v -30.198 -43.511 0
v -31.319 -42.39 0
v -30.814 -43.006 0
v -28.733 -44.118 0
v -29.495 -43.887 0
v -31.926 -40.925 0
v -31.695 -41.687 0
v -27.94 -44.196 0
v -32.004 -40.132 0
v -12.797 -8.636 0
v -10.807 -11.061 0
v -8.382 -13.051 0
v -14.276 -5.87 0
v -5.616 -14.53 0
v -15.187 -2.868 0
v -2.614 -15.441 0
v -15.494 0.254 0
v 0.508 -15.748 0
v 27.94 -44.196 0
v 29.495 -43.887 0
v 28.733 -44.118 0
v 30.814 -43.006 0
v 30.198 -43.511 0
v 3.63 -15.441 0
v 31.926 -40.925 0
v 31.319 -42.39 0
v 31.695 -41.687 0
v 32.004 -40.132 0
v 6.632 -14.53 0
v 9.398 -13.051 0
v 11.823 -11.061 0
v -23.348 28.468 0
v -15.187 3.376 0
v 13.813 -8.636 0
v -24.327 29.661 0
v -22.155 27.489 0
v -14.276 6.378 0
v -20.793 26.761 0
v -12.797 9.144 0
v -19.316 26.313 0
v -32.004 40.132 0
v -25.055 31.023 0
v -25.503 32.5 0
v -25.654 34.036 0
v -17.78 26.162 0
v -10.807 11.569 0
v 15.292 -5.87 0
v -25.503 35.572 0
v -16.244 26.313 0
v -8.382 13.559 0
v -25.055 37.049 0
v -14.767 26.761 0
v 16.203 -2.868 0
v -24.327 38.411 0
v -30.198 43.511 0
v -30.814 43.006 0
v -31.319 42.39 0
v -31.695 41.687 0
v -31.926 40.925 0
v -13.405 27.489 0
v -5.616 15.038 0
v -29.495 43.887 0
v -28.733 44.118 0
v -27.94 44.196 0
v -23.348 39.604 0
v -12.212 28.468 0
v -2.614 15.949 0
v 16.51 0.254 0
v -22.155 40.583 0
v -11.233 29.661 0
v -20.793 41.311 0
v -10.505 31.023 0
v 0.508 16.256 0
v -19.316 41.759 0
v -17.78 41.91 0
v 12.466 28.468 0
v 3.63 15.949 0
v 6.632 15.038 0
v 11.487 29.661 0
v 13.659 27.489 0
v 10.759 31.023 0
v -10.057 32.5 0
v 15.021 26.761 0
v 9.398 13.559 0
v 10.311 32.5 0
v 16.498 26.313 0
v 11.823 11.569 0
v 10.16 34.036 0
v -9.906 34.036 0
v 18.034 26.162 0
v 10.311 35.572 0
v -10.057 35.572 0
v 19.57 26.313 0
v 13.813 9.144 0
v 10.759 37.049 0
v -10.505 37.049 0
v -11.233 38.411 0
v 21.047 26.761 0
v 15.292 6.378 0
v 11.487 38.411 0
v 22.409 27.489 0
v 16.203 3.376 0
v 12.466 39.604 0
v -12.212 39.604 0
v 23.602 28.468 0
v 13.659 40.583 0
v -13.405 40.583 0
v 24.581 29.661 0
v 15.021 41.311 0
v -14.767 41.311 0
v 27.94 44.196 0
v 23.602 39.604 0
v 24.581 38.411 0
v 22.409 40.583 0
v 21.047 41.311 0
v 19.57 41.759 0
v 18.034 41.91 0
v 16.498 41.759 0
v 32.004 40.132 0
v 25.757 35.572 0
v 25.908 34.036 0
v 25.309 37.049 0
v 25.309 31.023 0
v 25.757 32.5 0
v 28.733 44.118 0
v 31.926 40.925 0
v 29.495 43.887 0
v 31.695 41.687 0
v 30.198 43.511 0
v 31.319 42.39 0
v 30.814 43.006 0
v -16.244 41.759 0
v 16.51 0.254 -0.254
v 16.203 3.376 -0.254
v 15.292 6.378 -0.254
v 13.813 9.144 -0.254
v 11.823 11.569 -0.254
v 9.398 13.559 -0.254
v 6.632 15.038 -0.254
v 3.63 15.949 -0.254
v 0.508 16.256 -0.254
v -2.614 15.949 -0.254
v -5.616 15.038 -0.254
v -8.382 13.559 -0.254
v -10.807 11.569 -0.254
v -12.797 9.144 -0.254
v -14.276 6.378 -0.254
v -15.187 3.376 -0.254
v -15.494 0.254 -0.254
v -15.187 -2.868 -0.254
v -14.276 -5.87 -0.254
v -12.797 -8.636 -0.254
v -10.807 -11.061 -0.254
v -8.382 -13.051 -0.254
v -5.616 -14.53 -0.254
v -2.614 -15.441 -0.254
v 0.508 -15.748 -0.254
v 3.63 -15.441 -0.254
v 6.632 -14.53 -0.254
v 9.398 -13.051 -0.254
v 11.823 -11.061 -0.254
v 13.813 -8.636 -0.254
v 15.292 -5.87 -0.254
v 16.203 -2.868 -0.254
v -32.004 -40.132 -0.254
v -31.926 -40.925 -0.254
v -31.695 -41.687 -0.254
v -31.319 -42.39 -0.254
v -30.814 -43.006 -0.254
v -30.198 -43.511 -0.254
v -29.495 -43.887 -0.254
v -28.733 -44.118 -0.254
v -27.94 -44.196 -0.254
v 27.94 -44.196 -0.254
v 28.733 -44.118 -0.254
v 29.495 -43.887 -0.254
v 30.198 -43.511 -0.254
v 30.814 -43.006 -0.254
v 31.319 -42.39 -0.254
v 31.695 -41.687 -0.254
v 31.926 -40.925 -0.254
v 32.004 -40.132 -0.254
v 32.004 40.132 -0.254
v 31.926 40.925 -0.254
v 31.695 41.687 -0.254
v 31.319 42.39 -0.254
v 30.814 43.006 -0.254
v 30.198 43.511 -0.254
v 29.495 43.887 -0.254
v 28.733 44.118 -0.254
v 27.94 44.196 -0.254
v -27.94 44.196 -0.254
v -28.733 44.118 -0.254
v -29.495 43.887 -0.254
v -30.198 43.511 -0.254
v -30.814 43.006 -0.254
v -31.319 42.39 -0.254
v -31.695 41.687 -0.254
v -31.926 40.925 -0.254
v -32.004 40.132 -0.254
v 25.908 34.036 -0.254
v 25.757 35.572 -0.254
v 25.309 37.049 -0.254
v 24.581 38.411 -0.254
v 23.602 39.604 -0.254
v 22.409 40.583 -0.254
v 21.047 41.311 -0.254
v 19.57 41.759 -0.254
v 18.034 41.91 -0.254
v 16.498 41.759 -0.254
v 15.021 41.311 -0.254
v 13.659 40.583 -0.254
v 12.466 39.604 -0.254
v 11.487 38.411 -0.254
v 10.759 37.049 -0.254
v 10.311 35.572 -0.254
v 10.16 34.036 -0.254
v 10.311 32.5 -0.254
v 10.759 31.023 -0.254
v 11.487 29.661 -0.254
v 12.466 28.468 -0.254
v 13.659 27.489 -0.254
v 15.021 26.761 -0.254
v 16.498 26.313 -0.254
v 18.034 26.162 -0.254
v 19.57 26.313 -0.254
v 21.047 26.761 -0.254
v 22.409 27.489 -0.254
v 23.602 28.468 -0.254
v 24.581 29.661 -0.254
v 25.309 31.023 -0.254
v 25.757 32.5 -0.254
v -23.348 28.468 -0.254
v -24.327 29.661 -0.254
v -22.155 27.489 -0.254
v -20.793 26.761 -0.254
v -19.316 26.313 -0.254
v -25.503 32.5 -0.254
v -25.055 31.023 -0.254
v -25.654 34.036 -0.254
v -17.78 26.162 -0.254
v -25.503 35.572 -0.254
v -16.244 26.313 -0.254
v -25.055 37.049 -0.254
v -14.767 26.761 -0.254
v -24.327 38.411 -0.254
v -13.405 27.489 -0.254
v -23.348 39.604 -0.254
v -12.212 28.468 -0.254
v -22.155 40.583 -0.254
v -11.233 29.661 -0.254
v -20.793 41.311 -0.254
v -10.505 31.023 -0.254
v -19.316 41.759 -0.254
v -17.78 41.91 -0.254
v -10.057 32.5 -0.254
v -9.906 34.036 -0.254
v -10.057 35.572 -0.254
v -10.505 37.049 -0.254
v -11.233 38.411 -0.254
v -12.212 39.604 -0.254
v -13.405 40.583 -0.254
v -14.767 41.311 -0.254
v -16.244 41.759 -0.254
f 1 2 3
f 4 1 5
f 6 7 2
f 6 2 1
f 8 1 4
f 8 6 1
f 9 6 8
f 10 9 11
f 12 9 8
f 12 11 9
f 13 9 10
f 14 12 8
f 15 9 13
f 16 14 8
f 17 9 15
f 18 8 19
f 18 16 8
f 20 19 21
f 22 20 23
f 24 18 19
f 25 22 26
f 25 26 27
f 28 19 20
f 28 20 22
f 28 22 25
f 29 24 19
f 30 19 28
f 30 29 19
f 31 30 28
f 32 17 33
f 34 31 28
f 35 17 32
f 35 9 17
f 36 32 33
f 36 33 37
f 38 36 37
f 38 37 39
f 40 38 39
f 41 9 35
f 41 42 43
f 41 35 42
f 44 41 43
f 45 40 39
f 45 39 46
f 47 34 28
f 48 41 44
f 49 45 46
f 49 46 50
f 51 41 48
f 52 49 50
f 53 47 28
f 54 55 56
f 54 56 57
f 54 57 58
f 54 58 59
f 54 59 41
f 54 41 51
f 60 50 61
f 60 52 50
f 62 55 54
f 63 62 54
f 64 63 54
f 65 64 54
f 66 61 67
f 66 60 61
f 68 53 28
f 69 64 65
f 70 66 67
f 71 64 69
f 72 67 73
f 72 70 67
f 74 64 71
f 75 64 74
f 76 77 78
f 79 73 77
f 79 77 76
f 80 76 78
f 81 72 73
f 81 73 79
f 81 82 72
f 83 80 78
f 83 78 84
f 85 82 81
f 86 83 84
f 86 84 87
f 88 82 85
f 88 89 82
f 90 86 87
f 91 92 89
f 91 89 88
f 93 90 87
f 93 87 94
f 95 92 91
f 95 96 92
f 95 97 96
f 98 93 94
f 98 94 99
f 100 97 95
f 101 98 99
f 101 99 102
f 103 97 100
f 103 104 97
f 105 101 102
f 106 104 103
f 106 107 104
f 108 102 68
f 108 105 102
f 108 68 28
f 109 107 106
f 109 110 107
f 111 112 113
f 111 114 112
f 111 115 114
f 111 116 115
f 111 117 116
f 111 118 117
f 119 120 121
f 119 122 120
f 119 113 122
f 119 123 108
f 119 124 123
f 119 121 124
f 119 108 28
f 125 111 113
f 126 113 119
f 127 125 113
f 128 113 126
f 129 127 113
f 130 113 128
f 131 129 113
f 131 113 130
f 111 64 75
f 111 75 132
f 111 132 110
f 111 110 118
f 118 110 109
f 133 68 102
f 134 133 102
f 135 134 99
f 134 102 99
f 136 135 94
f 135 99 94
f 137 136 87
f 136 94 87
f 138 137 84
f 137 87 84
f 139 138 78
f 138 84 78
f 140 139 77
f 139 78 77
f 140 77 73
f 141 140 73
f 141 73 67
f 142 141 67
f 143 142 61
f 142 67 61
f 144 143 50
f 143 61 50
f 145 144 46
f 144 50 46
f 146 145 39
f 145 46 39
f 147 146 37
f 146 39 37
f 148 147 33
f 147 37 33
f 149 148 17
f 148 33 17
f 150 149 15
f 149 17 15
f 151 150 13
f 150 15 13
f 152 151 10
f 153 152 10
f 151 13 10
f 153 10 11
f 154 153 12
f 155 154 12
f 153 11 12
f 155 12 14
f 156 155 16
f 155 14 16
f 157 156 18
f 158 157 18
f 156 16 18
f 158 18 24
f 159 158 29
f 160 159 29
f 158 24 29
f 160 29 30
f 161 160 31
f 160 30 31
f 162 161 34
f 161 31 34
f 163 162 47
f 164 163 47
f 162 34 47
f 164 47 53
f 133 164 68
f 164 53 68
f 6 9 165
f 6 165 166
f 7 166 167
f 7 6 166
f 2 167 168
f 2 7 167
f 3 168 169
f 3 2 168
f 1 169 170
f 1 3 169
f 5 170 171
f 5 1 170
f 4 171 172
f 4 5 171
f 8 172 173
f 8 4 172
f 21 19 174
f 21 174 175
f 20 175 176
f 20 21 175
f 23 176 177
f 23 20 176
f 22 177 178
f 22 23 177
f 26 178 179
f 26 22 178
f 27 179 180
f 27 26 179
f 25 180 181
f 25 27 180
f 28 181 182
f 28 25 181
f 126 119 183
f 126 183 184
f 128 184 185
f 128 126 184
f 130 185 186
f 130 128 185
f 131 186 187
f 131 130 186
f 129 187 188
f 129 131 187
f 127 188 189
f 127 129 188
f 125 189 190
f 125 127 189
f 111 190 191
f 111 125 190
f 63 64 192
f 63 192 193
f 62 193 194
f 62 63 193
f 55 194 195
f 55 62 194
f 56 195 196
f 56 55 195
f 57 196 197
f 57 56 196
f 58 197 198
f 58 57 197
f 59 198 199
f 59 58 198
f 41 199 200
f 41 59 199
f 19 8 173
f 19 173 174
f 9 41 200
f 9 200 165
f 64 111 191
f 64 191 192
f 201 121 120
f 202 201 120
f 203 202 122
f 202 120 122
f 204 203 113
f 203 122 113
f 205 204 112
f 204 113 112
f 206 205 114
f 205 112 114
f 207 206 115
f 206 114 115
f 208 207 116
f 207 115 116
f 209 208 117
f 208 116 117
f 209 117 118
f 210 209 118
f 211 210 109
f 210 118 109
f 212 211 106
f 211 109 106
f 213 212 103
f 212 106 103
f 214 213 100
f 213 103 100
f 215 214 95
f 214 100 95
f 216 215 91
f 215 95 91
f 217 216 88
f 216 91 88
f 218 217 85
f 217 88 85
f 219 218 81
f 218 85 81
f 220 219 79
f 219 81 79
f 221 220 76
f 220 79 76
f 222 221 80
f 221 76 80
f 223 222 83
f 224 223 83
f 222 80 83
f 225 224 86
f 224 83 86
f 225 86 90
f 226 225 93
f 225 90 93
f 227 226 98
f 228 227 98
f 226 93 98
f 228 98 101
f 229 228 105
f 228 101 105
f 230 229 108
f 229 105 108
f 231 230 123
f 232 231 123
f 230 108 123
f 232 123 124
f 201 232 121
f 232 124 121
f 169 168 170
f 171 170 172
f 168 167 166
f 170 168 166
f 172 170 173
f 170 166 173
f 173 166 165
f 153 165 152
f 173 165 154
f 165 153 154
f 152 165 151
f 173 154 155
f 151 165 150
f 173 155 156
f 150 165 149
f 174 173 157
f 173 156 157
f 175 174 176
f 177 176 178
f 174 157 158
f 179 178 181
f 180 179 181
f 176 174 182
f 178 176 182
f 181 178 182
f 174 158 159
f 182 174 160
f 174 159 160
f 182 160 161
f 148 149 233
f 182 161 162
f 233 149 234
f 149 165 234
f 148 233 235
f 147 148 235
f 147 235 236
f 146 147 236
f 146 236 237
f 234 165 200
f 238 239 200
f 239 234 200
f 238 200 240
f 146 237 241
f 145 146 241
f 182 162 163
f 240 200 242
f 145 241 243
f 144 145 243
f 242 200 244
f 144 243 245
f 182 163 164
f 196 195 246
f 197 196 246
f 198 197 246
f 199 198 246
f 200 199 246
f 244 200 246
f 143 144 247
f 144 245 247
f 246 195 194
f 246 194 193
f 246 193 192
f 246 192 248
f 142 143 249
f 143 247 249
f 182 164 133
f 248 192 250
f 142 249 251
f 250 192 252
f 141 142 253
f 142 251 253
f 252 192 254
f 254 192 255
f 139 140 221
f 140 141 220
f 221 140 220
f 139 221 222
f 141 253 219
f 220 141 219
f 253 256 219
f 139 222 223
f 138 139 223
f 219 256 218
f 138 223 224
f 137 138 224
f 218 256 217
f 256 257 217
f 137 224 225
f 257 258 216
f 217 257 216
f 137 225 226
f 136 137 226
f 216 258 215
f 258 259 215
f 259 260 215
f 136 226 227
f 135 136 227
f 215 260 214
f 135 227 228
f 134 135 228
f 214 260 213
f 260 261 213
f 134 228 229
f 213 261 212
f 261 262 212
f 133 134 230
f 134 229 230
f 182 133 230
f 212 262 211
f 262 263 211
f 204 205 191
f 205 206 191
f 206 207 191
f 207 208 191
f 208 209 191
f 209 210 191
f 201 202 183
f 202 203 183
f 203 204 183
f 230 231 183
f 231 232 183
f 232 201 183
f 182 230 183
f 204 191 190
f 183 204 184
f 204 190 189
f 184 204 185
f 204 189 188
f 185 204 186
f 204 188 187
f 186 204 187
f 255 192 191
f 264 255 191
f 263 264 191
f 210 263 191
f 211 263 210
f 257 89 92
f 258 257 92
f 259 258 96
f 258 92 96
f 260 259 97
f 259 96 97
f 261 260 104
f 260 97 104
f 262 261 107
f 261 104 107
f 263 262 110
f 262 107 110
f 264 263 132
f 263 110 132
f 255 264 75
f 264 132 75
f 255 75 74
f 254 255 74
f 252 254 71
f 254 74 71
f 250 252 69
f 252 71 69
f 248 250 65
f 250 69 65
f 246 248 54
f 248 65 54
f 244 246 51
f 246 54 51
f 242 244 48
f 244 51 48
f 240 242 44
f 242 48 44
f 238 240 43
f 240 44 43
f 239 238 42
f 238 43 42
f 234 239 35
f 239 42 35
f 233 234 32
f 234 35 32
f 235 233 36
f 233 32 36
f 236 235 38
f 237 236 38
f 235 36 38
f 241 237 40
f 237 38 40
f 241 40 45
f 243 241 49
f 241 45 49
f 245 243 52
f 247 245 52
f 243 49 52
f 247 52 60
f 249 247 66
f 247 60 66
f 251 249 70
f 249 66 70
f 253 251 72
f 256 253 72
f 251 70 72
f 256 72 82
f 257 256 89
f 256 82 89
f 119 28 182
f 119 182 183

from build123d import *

# Parameters (mm, degrees)
BOSS_EXTRUDE1_DEPTH = 0.254
SKETCH2_R           = 7.874
CUT_EXTRUDE1_DEPTH  = 0.254
SKETCH3_R           = 16.002
CUT_EXTRUDE2_DEPTH  = 0.254


with BuildPart() as part:
    # Sketch1 → Boss-Extrude1 (new body)
    with BuildSketch(Plane.XY):
        with BuildLine():
            Line((-27.94, -44.196), (27.94, -44.196))
            ThreePointArc((27.94, -44.196), (30.813681959, -43.005681959), (32.004, -40.132))
            Line((32.004, -40.132), (32.004, 40.132))
            ThreePointArc((32.004, 40.132), (30.813681959, 43.005681959), (27.94, 44.196))
            Line((27.94, 44.196), (-27.94, 44.196))
            ThreePointArc((-27.94, 44.196), (-30.813681959, 43.005681959), (-32.004, 40.132))
            Line((-32.004, 40.132), (-32.004, -40.132))
            ThreePointArc((-32.004, -40.132), (-30.813681959, -43.005681959), (-27.94, -44.196))
        make_face()
    extrude(amount=-BOSS_EXTRUDE1_DEPTH)

    # Sketch2 → Cut-Extrude1 (cut)
    with BuildSketch(Plane.XY):
        with Locations((18.034, 34.036)):
            Circle(SKETCH2_R)
        with Locations((-17.78, 34.036)):
            Circle(SKETCH2_R)
    extrude(amount=-CUT_EXTRUDE1_DEPTH, mode=Mode.SUBTRACT)

    # Sketch3 → Cut-Extrude2 (cut)
    with BuildSketch(Plane.XY):
        with Locations((0.508, 0.254)):
            Circle(SKETCH3_R)
    extrude(amount=-CUT_EXTRUDE2_DEPTH, mode=Mode.SUBTRACT)


solid = part.part
